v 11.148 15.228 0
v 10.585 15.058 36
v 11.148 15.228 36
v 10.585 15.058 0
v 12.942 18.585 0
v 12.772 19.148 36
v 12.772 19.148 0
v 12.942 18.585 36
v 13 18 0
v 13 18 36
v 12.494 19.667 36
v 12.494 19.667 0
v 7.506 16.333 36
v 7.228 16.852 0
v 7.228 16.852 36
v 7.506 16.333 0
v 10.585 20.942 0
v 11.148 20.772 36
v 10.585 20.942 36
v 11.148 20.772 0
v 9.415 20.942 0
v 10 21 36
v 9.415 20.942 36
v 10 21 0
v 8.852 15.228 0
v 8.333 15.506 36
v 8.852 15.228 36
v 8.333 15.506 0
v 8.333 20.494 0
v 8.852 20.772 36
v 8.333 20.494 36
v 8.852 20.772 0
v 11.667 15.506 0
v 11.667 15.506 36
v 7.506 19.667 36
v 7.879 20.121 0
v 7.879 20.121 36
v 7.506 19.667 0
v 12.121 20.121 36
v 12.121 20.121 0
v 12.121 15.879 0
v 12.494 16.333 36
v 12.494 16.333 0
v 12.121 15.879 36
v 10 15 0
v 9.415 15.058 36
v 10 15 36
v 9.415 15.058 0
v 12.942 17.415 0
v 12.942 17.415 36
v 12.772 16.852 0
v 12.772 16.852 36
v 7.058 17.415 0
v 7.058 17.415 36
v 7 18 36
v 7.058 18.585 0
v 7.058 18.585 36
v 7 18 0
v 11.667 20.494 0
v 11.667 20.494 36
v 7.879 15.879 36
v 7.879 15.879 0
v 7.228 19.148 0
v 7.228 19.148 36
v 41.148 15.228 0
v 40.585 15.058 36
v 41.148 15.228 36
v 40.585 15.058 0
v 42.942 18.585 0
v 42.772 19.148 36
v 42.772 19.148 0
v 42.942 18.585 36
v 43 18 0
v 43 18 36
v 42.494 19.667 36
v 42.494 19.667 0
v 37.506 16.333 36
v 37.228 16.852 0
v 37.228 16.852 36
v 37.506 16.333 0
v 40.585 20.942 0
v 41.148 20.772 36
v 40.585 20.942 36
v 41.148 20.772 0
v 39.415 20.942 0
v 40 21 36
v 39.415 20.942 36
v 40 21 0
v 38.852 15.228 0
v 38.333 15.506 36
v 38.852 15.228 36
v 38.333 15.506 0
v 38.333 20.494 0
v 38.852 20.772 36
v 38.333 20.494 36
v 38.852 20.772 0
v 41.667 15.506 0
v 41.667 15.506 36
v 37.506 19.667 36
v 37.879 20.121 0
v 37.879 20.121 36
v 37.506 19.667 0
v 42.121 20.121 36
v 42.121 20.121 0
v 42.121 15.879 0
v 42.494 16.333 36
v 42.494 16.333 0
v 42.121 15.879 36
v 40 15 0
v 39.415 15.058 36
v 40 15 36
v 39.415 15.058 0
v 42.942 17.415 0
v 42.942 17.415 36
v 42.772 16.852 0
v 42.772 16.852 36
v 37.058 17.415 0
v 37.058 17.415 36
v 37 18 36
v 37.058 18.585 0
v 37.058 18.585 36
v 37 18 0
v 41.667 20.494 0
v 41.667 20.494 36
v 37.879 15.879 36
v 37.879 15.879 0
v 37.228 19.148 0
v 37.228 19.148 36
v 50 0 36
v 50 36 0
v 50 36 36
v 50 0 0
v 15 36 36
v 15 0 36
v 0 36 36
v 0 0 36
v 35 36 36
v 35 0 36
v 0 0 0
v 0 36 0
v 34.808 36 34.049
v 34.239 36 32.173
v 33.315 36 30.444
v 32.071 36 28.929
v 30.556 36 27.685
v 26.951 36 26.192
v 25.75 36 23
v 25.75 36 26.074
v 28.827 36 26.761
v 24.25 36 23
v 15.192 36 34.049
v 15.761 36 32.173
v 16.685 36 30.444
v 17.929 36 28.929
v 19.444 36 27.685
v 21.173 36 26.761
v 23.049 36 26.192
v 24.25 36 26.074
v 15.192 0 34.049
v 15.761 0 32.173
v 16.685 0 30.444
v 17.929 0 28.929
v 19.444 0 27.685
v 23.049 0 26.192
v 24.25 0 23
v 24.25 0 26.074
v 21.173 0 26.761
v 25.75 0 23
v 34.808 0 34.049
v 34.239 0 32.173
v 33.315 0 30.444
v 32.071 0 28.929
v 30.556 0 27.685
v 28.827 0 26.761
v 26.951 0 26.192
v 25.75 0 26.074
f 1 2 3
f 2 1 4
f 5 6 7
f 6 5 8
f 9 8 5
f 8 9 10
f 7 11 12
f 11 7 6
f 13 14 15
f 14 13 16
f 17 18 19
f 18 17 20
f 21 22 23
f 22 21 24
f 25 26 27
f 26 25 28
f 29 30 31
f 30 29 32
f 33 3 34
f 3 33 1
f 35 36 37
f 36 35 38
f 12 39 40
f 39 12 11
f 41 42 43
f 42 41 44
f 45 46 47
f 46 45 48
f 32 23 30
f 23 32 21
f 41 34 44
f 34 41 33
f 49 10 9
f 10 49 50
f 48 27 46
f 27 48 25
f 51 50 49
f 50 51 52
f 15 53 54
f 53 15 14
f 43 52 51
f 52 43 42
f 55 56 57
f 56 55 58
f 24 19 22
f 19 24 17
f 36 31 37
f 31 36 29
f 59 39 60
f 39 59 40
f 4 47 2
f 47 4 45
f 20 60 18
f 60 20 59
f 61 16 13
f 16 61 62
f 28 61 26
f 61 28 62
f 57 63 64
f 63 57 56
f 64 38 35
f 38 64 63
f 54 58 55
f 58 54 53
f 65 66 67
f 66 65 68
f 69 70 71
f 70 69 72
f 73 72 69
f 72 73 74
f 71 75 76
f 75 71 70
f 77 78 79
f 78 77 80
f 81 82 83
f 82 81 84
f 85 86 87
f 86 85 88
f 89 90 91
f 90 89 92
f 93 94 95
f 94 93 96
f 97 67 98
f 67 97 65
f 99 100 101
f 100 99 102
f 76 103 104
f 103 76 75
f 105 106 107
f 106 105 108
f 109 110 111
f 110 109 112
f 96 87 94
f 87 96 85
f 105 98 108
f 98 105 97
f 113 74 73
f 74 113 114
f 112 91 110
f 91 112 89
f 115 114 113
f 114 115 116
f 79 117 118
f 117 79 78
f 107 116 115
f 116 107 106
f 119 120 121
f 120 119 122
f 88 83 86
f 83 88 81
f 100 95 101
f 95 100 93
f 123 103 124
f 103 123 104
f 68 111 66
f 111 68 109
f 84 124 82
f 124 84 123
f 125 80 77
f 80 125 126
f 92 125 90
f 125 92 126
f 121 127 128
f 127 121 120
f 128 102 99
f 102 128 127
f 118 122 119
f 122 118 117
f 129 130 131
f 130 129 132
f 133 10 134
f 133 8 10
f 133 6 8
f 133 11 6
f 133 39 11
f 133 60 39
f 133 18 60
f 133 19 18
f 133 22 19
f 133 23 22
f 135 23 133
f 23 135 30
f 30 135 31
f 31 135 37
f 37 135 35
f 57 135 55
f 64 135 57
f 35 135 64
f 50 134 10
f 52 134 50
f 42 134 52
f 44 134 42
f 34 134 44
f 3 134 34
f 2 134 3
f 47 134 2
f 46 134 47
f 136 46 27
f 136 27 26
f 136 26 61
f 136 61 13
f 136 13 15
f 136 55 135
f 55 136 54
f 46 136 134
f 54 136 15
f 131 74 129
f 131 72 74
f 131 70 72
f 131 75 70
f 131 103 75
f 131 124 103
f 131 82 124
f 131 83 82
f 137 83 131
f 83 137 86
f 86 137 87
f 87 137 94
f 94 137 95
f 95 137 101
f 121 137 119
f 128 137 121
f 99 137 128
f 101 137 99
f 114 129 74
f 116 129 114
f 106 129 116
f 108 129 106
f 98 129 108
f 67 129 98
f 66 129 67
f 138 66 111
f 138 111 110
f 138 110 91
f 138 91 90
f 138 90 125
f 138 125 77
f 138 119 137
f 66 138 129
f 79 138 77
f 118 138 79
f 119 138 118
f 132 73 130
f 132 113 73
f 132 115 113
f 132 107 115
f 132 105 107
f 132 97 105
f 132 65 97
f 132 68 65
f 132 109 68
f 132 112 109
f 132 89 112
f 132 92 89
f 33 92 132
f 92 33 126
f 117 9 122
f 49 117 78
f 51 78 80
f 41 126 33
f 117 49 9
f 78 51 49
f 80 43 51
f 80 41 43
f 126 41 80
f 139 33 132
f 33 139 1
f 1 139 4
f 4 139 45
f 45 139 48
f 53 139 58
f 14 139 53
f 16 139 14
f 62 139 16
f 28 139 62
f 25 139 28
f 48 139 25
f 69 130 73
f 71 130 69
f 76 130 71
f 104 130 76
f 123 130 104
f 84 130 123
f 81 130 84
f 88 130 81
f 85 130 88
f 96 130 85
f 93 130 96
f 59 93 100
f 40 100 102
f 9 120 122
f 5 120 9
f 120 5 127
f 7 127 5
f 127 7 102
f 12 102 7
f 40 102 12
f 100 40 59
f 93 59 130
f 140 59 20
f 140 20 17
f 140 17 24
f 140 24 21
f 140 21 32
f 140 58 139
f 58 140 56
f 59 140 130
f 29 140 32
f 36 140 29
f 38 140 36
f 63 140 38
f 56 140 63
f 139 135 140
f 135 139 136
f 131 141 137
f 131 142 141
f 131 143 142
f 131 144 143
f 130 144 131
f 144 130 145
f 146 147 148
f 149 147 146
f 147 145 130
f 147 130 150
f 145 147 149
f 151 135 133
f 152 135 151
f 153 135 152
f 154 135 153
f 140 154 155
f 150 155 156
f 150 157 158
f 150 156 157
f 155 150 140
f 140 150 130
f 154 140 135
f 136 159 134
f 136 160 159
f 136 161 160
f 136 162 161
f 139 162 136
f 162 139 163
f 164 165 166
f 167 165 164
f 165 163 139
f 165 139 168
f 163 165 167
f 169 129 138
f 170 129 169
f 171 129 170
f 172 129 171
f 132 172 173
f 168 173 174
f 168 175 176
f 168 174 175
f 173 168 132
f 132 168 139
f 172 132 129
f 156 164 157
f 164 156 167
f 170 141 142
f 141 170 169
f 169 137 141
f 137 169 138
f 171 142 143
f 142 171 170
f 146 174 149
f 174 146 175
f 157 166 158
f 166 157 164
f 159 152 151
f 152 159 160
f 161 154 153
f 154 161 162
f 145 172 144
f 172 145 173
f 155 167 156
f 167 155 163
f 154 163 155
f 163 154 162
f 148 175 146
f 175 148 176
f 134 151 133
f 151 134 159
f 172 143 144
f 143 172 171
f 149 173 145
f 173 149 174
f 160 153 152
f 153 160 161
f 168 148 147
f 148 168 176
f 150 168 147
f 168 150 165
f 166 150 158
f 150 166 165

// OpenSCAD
$fn = 32;

// ----------------------------------------------------------------------
// Saddle clamp: split shaft clamp
// ----------------------------------------------------------------------

// --- parameters (mm) ---
blk_l = 50;               // block length, X
blk_w = 36;               // block width, Y
blk_h = 36;               // block height
clamp_r = 10;             // shaft groove radius
hole_r = 3;               // bolt hole radius
hole_m = 10;              // bolt hole margin from the ends
saw_w = 1.5;              // saw kerf width
fit_tol = 0.1;            // tolerance for press fits, mm
free_tol = 0.3;           // tolerance for clearance fits, mm

saw_depth = clamp_r + 3;  // saw kerf depth

difference() {
  cube([blk_l, blk_w, blk_h]);
  translate([blk_l / 2, -1, blk_h])
    rotate([-90, 0, 0])
      cylinder(h = blk_w + 2, r = clamp_r);
  for (sx = [0, 1])
    translate([sx ? blk_l - hole_m : hole_m, blk_w / 2, -1])
      cylinder(r = hole_r, h = blk_h + 2);
  translate([blk_l / 2 - saw_w / 2, -1, blk_h - saw_depth])
    cube([saw_w, blk_w + 2, saw_depth + 1]);
}
